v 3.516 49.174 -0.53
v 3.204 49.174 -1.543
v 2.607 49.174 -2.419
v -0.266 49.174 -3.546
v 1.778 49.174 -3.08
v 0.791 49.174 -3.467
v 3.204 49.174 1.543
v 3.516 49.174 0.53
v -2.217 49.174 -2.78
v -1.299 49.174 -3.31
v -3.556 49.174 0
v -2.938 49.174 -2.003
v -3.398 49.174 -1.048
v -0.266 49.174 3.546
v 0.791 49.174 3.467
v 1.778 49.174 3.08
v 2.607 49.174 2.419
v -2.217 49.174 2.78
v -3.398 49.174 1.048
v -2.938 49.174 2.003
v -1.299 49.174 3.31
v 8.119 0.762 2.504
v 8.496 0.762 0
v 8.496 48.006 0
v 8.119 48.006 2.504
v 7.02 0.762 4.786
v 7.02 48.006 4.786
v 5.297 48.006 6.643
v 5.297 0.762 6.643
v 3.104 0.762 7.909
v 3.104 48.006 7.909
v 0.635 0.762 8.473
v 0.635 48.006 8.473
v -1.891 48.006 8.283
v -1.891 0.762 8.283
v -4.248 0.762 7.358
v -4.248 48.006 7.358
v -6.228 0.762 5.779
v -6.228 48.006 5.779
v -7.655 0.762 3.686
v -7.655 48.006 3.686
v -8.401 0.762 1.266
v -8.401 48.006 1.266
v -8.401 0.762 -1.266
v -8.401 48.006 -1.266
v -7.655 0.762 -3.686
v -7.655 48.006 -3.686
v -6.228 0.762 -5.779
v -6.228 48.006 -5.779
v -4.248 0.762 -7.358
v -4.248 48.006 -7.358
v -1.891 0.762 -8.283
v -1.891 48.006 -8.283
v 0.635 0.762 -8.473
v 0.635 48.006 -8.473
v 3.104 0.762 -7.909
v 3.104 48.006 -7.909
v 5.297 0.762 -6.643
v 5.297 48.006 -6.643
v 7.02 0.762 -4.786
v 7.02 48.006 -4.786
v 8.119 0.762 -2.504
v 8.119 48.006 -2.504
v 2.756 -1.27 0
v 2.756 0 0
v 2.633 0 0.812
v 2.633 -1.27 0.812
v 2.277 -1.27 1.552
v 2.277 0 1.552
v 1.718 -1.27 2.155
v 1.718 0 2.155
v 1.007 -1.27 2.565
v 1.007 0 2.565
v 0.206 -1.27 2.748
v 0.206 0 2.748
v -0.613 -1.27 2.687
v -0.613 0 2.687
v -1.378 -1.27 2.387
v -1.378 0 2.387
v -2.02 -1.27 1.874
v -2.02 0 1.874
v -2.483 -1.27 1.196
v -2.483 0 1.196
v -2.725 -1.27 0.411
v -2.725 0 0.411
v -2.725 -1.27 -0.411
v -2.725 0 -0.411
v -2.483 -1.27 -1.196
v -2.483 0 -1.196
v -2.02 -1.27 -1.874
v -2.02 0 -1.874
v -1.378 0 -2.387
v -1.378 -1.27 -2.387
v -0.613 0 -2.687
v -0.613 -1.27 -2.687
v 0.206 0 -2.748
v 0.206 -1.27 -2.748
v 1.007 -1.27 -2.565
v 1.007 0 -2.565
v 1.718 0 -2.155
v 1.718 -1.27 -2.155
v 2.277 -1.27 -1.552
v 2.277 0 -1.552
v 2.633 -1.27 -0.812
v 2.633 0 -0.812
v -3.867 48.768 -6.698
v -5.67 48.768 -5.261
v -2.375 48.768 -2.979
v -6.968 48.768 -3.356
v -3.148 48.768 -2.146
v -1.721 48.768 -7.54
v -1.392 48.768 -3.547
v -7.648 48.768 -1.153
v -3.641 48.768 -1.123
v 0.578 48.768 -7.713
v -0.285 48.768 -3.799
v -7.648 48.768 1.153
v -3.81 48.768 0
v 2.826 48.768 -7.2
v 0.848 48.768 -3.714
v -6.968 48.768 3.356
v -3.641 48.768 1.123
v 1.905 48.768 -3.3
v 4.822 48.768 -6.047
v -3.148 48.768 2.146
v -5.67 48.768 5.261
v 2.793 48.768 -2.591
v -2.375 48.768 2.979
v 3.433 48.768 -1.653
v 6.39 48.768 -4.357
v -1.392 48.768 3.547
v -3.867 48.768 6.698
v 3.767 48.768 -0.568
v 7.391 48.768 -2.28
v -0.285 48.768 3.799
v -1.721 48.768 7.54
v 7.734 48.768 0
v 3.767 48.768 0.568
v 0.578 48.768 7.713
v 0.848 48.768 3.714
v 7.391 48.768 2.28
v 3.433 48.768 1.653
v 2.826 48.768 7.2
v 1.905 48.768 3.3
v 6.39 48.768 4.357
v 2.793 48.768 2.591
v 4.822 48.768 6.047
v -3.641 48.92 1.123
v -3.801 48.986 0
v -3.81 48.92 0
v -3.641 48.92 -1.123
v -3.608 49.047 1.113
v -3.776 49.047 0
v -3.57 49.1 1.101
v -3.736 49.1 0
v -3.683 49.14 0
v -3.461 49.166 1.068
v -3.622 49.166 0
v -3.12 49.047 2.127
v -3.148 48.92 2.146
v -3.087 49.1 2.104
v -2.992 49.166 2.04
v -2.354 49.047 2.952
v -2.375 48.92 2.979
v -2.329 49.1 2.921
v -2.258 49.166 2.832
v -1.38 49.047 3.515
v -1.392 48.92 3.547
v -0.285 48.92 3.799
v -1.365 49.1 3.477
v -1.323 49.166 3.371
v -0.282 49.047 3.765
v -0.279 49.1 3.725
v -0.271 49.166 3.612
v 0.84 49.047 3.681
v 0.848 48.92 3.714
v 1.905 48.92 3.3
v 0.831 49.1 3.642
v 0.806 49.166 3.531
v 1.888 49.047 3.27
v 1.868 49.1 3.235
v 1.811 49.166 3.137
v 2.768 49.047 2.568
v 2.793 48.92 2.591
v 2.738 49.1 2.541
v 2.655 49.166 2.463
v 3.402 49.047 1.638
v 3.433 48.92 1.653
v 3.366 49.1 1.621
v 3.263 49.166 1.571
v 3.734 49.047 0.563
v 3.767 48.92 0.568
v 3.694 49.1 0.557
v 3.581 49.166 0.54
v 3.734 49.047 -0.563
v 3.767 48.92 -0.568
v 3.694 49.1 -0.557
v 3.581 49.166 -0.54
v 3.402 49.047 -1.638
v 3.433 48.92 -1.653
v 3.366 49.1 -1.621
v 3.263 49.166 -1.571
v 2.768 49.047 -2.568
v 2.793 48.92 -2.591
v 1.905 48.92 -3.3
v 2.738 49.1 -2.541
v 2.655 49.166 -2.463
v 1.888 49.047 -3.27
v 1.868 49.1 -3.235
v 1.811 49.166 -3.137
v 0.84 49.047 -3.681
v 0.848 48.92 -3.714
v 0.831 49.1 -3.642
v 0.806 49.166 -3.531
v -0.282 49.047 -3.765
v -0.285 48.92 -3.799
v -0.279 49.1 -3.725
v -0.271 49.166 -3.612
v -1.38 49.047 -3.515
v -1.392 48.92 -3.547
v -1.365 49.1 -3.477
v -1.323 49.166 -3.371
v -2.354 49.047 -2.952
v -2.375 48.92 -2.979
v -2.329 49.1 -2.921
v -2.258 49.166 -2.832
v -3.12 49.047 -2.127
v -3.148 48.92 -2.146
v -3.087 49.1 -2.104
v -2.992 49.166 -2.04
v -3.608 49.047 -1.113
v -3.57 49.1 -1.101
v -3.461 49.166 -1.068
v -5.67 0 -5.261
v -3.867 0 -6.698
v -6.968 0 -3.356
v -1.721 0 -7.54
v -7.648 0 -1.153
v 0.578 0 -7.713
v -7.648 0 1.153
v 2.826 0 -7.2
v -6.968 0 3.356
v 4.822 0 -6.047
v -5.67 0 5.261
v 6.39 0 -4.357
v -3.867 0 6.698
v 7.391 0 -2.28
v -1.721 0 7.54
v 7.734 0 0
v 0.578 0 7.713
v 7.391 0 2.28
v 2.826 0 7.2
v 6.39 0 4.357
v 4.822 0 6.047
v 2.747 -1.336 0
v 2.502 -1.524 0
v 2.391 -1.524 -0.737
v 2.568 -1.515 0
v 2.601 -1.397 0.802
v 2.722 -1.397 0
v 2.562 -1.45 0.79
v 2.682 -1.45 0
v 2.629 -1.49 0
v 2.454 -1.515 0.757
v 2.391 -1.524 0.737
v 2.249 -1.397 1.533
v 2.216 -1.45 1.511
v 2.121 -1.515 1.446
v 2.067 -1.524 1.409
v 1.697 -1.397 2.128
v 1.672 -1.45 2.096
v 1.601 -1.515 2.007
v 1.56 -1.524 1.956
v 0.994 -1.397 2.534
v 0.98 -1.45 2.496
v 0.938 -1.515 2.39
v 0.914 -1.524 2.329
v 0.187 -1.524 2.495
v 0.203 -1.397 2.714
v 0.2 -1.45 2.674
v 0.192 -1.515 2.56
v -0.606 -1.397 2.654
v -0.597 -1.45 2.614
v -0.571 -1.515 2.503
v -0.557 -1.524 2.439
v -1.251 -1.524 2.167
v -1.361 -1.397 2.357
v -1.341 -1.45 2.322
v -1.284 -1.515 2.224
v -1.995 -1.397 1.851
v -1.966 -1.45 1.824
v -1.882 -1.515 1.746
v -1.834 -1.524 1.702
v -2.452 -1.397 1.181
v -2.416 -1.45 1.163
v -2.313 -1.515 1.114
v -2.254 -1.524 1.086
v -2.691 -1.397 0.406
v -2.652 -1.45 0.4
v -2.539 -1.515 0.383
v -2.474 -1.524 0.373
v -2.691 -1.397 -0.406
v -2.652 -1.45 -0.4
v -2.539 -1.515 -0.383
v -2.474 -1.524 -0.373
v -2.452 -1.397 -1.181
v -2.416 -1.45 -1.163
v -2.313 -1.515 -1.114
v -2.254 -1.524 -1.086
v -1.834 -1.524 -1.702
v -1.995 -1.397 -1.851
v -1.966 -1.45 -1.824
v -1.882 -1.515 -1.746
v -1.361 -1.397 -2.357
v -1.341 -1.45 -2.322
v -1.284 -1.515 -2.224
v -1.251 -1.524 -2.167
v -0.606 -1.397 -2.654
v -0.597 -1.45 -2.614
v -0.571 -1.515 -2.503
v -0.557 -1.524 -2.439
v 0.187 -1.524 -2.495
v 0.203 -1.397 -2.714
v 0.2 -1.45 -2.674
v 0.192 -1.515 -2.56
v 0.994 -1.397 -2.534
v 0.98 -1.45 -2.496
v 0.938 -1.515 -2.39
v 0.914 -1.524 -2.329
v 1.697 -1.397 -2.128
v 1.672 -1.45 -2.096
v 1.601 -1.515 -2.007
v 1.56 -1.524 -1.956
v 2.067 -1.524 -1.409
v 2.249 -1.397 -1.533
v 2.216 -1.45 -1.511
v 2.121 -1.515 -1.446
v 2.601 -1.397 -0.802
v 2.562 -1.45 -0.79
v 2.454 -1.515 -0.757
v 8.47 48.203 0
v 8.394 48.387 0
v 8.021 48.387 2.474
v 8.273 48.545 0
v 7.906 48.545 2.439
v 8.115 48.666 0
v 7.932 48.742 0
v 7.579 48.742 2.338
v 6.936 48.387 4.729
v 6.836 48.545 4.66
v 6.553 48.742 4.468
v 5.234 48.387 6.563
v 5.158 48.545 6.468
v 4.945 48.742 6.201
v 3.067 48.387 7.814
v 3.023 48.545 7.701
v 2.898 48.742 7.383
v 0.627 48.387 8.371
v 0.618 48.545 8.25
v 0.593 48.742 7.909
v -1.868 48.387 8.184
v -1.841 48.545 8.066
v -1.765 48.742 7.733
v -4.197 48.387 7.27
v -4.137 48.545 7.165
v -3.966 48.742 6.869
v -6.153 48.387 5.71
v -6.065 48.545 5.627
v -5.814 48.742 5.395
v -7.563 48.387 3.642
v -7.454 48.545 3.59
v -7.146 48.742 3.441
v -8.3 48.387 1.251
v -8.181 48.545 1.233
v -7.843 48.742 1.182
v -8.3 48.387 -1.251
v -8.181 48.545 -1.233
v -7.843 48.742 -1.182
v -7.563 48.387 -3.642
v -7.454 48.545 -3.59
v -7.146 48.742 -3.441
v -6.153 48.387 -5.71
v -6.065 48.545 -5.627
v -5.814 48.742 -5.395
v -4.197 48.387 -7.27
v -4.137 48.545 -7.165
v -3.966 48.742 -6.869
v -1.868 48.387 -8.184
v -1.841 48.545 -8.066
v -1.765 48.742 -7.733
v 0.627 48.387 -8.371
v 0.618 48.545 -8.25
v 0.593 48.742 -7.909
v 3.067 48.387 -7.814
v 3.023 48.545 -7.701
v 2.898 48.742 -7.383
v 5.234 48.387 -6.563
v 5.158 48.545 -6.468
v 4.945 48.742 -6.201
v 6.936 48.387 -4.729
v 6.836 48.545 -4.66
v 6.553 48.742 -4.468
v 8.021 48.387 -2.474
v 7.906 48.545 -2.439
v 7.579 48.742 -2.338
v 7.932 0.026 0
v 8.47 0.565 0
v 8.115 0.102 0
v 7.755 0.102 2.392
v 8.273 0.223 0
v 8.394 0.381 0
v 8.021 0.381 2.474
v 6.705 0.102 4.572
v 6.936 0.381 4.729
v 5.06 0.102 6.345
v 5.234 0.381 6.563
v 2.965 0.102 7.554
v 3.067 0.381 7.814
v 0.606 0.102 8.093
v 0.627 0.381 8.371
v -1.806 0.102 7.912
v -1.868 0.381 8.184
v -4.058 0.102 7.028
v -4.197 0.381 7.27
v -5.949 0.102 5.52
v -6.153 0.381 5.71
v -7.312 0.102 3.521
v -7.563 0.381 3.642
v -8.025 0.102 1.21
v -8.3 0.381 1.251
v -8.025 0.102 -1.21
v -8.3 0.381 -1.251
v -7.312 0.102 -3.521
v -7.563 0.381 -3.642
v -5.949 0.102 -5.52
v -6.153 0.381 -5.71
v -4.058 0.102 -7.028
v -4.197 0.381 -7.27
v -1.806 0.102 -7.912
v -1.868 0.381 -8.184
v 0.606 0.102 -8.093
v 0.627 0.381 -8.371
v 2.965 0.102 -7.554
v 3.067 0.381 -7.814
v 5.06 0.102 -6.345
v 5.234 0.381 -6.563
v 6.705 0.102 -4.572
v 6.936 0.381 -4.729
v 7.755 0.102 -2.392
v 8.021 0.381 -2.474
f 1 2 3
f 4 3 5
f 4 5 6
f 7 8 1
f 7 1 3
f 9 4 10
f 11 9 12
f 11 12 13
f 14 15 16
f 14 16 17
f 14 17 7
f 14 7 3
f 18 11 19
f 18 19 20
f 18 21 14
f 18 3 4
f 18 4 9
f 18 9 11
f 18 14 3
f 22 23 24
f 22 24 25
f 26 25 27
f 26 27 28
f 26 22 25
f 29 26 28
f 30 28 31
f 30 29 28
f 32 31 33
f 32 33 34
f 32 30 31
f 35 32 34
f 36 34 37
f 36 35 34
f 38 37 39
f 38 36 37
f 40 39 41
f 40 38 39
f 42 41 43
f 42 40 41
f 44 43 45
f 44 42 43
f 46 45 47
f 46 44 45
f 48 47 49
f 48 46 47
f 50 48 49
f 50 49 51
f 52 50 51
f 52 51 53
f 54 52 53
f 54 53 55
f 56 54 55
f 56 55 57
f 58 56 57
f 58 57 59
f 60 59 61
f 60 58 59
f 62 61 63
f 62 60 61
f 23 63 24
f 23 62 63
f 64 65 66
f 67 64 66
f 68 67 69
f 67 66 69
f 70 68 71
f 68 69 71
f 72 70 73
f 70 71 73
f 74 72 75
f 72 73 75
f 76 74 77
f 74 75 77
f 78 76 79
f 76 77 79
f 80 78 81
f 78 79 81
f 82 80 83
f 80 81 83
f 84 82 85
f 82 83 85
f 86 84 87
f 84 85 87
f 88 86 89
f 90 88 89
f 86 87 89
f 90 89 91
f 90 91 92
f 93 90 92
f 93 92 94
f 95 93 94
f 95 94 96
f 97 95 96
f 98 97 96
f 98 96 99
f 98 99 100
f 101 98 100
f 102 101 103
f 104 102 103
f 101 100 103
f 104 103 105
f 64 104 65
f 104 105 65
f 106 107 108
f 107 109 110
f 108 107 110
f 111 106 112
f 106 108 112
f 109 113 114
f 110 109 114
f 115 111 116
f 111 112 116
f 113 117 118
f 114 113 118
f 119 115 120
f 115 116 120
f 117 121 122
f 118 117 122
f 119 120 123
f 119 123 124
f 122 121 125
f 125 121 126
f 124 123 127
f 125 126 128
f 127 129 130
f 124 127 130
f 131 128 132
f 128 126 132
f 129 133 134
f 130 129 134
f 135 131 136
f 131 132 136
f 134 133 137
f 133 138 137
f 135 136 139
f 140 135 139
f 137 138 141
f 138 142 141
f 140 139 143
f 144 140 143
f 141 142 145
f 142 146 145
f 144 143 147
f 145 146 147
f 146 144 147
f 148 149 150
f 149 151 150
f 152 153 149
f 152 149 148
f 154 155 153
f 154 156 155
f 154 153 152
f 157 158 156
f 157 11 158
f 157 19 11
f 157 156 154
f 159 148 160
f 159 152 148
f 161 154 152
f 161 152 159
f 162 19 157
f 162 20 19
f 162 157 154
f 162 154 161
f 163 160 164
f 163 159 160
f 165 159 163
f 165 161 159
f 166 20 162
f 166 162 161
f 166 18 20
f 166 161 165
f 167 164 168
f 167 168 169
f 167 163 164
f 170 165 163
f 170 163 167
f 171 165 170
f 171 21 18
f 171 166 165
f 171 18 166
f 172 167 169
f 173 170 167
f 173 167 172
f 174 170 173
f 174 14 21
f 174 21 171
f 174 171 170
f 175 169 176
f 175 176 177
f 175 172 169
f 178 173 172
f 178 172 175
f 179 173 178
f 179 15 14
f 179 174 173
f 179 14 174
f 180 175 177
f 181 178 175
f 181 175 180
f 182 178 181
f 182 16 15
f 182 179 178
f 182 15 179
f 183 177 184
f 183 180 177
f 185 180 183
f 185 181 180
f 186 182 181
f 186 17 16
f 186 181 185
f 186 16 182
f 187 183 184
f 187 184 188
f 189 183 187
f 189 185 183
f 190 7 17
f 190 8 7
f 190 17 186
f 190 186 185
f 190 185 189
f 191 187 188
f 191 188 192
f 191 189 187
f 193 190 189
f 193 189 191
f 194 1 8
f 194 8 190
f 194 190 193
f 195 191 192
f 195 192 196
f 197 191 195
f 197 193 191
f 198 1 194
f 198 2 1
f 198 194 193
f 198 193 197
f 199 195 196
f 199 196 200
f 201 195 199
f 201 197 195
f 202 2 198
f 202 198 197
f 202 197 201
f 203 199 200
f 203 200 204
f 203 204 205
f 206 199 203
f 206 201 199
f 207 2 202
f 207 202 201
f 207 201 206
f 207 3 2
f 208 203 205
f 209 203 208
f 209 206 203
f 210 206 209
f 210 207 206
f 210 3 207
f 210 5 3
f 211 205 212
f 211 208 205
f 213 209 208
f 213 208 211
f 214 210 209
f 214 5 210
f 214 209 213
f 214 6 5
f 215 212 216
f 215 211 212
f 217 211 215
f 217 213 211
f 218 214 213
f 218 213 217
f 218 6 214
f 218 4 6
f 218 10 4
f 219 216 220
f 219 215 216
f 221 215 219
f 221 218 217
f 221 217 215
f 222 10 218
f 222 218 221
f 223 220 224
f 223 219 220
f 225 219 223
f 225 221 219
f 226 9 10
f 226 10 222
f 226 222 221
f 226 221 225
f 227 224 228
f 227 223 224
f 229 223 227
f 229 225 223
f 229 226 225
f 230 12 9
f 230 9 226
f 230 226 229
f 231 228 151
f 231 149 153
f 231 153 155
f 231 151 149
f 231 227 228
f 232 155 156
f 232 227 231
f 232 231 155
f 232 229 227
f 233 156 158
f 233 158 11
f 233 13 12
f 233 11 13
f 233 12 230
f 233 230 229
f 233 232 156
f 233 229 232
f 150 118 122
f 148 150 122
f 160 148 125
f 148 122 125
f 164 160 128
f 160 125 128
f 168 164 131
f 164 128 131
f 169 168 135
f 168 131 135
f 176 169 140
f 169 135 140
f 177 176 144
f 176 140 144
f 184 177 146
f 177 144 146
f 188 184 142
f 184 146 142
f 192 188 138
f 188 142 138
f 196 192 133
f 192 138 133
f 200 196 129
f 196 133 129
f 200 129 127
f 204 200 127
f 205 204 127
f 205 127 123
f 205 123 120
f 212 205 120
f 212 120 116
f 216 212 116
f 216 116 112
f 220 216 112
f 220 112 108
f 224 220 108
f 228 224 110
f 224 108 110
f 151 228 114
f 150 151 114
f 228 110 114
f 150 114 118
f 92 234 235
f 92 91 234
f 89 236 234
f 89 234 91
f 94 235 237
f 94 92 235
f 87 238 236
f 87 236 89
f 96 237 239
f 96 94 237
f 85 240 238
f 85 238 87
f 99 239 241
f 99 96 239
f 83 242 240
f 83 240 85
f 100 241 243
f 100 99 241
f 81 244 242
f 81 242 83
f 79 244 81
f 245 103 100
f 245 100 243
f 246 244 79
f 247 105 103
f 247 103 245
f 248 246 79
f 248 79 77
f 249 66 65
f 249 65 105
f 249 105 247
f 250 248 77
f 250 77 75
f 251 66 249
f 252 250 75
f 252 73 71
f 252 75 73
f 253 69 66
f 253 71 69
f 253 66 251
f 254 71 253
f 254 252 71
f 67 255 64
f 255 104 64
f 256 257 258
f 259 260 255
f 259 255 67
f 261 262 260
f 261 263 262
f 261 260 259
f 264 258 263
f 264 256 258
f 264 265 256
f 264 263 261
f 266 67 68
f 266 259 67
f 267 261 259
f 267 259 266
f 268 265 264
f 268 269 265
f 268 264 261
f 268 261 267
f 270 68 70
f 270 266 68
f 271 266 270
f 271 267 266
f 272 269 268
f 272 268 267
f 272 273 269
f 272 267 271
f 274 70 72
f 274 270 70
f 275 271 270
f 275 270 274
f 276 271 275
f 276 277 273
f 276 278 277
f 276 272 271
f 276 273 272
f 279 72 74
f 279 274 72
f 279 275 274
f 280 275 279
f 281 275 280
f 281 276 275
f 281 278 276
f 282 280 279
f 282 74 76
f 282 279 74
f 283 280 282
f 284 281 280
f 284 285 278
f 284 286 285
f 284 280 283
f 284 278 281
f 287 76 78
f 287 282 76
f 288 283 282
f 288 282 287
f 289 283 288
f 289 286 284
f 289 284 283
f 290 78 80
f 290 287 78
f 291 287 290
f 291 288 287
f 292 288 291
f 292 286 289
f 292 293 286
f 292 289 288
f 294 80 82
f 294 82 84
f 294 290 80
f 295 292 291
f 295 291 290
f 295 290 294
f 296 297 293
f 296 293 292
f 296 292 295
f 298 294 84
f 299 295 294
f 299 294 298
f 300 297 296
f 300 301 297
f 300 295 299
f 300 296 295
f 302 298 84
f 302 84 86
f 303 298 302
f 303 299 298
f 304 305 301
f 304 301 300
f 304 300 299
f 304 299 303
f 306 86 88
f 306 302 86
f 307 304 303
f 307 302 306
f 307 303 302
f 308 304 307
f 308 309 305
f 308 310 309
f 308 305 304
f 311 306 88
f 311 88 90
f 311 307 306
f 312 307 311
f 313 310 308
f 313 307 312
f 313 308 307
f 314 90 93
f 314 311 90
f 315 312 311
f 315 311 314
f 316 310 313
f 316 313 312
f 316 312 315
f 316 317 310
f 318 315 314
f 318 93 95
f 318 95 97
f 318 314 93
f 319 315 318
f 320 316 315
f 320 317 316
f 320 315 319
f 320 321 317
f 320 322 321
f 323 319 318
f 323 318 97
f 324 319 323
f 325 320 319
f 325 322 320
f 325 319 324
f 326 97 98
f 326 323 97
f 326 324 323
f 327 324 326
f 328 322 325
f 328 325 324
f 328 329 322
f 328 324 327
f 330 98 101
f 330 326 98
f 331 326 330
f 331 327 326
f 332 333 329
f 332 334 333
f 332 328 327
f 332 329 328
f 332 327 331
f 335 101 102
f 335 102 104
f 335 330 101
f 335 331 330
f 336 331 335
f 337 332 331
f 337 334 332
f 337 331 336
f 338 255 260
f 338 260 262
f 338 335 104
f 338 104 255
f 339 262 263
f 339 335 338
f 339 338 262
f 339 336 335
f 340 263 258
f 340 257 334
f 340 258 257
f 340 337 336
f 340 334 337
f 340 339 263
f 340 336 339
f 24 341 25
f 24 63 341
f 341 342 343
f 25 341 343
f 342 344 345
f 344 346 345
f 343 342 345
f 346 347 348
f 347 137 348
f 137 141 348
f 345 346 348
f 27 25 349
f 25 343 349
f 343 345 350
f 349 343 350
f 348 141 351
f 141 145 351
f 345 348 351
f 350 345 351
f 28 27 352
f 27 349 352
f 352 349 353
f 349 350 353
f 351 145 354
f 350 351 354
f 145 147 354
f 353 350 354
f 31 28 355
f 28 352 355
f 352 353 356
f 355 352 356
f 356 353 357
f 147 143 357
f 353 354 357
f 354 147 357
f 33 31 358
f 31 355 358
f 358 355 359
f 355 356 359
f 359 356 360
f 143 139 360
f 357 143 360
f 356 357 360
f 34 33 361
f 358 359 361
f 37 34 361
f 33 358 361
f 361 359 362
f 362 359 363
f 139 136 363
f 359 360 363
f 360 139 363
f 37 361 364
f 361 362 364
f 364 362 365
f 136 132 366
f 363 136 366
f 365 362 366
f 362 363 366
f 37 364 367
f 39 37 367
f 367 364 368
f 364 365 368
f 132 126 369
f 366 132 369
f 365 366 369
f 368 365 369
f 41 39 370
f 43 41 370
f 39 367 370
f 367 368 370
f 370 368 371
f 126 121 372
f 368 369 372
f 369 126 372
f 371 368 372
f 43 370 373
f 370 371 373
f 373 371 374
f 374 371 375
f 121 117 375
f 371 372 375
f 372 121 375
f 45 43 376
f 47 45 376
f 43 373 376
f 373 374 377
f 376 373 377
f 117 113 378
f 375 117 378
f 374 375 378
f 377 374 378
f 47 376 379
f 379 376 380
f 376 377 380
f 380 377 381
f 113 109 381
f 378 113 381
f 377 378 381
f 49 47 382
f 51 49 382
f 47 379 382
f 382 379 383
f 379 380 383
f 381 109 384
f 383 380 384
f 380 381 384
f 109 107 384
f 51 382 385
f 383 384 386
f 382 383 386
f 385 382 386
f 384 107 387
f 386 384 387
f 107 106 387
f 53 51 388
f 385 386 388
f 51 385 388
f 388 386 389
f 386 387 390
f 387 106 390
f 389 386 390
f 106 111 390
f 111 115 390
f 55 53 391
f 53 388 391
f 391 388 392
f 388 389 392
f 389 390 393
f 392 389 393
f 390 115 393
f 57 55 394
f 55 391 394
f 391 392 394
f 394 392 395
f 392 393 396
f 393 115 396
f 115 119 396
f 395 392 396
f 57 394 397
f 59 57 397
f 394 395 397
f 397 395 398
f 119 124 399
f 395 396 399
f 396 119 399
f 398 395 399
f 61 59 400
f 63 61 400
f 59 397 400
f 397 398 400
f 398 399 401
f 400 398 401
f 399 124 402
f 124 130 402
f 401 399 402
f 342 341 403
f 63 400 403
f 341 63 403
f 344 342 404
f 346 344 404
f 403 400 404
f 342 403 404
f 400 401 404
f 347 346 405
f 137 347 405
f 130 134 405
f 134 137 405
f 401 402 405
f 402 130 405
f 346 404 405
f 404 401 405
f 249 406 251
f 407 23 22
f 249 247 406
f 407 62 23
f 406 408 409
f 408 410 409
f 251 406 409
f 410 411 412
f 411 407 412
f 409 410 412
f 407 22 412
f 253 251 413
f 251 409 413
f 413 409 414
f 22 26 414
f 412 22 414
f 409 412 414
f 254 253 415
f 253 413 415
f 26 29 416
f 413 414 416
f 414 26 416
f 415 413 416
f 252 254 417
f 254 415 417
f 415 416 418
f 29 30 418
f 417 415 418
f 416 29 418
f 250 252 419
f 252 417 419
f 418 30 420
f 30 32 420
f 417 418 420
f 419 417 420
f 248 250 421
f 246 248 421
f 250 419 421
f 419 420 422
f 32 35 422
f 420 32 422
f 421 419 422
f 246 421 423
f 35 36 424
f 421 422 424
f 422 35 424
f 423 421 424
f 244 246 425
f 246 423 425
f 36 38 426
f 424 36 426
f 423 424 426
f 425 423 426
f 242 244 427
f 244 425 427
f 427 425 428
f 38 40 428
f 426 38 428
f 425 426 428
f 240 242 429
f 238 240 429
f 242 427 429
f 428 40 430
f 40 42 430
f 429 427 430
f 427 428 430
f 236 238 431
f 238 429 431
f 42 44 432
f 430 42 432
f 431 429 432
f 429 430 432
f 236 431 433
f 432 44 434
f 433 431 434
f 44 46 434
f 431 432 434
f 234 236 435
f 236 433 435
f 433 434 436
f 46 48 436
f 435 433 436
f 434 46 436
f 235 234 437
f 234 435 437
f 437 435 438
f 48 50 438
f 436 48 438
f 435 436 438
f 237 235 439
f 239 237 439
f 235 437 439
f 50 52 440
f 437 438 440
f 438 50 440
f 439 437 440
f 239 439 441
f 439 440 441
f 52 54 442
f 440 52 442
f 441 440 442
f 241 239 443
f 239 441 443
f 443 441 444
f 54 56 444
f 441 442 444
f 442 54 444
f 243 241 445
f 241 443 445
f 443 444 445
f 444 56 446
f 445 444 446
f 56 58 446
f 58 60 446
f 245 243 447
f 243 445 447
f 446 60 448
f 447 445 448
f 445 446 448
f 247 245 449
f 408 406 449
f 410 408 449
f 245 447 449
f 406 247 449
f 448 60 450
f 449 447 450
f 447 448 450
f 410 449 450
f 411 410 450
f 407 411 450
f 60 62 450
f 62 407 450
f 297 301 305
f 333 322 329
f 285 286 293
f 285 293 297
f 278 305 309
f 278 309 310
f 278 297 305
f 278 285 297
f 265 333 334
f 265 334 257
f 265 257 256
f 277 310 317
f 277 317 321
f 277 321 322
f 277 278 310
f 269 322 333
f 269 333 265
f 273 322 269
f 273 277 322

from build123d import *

# Parameters (mm, degrees)
F0_R     = 8.4963
F1_DEPTH = 48.768
F2_R     = 2.7559
F3_DEPTH = 1.524
F4_R     = 3.81
F5_DEPTH = 0.4064
F6_R     = 0.254
F7_R     = 0.762


with BuildPart() as f1:
    # F0 (on Front) → F1 (new body)
    with BuildSketch(Plane.XZ):
        Circle(F0_R)
    extrude(amount=-F1_DEPTH)

    # F2 (on face) → F3 (join)
    with BuildSketch(Plane.XZ):
        Circle(F2_R)
    extrude(amount=F3_DEPTH)

    # F4 (on face) → F5 (join)
    with BuildSketch(Plane(origin=(0, 48.768, 0), x_dir=(-1, 0, 0), z_dir=(0, 1, 0))):
        Circle(F4_R)
    extrude(amount=F5_DEPTH)

    # F6
    f6_edges = [f1.edges().sort_by_distance(p)[0] for p in [
        (3.81, 49.1744, 0),
        (-2.7559, -1.524, 0),
    ]]
    fillet(f6_edges, radius=F6_R)

    # F7
    f7_edges = [f1.edges().sort_by_distance(p)[0] for p in [
        (-8.4963, 48.768, 0),
        (-8.4963, 0, 0),
    ]]
    fillet(f7_edges, radius=F7_R)


solid = f1.part
